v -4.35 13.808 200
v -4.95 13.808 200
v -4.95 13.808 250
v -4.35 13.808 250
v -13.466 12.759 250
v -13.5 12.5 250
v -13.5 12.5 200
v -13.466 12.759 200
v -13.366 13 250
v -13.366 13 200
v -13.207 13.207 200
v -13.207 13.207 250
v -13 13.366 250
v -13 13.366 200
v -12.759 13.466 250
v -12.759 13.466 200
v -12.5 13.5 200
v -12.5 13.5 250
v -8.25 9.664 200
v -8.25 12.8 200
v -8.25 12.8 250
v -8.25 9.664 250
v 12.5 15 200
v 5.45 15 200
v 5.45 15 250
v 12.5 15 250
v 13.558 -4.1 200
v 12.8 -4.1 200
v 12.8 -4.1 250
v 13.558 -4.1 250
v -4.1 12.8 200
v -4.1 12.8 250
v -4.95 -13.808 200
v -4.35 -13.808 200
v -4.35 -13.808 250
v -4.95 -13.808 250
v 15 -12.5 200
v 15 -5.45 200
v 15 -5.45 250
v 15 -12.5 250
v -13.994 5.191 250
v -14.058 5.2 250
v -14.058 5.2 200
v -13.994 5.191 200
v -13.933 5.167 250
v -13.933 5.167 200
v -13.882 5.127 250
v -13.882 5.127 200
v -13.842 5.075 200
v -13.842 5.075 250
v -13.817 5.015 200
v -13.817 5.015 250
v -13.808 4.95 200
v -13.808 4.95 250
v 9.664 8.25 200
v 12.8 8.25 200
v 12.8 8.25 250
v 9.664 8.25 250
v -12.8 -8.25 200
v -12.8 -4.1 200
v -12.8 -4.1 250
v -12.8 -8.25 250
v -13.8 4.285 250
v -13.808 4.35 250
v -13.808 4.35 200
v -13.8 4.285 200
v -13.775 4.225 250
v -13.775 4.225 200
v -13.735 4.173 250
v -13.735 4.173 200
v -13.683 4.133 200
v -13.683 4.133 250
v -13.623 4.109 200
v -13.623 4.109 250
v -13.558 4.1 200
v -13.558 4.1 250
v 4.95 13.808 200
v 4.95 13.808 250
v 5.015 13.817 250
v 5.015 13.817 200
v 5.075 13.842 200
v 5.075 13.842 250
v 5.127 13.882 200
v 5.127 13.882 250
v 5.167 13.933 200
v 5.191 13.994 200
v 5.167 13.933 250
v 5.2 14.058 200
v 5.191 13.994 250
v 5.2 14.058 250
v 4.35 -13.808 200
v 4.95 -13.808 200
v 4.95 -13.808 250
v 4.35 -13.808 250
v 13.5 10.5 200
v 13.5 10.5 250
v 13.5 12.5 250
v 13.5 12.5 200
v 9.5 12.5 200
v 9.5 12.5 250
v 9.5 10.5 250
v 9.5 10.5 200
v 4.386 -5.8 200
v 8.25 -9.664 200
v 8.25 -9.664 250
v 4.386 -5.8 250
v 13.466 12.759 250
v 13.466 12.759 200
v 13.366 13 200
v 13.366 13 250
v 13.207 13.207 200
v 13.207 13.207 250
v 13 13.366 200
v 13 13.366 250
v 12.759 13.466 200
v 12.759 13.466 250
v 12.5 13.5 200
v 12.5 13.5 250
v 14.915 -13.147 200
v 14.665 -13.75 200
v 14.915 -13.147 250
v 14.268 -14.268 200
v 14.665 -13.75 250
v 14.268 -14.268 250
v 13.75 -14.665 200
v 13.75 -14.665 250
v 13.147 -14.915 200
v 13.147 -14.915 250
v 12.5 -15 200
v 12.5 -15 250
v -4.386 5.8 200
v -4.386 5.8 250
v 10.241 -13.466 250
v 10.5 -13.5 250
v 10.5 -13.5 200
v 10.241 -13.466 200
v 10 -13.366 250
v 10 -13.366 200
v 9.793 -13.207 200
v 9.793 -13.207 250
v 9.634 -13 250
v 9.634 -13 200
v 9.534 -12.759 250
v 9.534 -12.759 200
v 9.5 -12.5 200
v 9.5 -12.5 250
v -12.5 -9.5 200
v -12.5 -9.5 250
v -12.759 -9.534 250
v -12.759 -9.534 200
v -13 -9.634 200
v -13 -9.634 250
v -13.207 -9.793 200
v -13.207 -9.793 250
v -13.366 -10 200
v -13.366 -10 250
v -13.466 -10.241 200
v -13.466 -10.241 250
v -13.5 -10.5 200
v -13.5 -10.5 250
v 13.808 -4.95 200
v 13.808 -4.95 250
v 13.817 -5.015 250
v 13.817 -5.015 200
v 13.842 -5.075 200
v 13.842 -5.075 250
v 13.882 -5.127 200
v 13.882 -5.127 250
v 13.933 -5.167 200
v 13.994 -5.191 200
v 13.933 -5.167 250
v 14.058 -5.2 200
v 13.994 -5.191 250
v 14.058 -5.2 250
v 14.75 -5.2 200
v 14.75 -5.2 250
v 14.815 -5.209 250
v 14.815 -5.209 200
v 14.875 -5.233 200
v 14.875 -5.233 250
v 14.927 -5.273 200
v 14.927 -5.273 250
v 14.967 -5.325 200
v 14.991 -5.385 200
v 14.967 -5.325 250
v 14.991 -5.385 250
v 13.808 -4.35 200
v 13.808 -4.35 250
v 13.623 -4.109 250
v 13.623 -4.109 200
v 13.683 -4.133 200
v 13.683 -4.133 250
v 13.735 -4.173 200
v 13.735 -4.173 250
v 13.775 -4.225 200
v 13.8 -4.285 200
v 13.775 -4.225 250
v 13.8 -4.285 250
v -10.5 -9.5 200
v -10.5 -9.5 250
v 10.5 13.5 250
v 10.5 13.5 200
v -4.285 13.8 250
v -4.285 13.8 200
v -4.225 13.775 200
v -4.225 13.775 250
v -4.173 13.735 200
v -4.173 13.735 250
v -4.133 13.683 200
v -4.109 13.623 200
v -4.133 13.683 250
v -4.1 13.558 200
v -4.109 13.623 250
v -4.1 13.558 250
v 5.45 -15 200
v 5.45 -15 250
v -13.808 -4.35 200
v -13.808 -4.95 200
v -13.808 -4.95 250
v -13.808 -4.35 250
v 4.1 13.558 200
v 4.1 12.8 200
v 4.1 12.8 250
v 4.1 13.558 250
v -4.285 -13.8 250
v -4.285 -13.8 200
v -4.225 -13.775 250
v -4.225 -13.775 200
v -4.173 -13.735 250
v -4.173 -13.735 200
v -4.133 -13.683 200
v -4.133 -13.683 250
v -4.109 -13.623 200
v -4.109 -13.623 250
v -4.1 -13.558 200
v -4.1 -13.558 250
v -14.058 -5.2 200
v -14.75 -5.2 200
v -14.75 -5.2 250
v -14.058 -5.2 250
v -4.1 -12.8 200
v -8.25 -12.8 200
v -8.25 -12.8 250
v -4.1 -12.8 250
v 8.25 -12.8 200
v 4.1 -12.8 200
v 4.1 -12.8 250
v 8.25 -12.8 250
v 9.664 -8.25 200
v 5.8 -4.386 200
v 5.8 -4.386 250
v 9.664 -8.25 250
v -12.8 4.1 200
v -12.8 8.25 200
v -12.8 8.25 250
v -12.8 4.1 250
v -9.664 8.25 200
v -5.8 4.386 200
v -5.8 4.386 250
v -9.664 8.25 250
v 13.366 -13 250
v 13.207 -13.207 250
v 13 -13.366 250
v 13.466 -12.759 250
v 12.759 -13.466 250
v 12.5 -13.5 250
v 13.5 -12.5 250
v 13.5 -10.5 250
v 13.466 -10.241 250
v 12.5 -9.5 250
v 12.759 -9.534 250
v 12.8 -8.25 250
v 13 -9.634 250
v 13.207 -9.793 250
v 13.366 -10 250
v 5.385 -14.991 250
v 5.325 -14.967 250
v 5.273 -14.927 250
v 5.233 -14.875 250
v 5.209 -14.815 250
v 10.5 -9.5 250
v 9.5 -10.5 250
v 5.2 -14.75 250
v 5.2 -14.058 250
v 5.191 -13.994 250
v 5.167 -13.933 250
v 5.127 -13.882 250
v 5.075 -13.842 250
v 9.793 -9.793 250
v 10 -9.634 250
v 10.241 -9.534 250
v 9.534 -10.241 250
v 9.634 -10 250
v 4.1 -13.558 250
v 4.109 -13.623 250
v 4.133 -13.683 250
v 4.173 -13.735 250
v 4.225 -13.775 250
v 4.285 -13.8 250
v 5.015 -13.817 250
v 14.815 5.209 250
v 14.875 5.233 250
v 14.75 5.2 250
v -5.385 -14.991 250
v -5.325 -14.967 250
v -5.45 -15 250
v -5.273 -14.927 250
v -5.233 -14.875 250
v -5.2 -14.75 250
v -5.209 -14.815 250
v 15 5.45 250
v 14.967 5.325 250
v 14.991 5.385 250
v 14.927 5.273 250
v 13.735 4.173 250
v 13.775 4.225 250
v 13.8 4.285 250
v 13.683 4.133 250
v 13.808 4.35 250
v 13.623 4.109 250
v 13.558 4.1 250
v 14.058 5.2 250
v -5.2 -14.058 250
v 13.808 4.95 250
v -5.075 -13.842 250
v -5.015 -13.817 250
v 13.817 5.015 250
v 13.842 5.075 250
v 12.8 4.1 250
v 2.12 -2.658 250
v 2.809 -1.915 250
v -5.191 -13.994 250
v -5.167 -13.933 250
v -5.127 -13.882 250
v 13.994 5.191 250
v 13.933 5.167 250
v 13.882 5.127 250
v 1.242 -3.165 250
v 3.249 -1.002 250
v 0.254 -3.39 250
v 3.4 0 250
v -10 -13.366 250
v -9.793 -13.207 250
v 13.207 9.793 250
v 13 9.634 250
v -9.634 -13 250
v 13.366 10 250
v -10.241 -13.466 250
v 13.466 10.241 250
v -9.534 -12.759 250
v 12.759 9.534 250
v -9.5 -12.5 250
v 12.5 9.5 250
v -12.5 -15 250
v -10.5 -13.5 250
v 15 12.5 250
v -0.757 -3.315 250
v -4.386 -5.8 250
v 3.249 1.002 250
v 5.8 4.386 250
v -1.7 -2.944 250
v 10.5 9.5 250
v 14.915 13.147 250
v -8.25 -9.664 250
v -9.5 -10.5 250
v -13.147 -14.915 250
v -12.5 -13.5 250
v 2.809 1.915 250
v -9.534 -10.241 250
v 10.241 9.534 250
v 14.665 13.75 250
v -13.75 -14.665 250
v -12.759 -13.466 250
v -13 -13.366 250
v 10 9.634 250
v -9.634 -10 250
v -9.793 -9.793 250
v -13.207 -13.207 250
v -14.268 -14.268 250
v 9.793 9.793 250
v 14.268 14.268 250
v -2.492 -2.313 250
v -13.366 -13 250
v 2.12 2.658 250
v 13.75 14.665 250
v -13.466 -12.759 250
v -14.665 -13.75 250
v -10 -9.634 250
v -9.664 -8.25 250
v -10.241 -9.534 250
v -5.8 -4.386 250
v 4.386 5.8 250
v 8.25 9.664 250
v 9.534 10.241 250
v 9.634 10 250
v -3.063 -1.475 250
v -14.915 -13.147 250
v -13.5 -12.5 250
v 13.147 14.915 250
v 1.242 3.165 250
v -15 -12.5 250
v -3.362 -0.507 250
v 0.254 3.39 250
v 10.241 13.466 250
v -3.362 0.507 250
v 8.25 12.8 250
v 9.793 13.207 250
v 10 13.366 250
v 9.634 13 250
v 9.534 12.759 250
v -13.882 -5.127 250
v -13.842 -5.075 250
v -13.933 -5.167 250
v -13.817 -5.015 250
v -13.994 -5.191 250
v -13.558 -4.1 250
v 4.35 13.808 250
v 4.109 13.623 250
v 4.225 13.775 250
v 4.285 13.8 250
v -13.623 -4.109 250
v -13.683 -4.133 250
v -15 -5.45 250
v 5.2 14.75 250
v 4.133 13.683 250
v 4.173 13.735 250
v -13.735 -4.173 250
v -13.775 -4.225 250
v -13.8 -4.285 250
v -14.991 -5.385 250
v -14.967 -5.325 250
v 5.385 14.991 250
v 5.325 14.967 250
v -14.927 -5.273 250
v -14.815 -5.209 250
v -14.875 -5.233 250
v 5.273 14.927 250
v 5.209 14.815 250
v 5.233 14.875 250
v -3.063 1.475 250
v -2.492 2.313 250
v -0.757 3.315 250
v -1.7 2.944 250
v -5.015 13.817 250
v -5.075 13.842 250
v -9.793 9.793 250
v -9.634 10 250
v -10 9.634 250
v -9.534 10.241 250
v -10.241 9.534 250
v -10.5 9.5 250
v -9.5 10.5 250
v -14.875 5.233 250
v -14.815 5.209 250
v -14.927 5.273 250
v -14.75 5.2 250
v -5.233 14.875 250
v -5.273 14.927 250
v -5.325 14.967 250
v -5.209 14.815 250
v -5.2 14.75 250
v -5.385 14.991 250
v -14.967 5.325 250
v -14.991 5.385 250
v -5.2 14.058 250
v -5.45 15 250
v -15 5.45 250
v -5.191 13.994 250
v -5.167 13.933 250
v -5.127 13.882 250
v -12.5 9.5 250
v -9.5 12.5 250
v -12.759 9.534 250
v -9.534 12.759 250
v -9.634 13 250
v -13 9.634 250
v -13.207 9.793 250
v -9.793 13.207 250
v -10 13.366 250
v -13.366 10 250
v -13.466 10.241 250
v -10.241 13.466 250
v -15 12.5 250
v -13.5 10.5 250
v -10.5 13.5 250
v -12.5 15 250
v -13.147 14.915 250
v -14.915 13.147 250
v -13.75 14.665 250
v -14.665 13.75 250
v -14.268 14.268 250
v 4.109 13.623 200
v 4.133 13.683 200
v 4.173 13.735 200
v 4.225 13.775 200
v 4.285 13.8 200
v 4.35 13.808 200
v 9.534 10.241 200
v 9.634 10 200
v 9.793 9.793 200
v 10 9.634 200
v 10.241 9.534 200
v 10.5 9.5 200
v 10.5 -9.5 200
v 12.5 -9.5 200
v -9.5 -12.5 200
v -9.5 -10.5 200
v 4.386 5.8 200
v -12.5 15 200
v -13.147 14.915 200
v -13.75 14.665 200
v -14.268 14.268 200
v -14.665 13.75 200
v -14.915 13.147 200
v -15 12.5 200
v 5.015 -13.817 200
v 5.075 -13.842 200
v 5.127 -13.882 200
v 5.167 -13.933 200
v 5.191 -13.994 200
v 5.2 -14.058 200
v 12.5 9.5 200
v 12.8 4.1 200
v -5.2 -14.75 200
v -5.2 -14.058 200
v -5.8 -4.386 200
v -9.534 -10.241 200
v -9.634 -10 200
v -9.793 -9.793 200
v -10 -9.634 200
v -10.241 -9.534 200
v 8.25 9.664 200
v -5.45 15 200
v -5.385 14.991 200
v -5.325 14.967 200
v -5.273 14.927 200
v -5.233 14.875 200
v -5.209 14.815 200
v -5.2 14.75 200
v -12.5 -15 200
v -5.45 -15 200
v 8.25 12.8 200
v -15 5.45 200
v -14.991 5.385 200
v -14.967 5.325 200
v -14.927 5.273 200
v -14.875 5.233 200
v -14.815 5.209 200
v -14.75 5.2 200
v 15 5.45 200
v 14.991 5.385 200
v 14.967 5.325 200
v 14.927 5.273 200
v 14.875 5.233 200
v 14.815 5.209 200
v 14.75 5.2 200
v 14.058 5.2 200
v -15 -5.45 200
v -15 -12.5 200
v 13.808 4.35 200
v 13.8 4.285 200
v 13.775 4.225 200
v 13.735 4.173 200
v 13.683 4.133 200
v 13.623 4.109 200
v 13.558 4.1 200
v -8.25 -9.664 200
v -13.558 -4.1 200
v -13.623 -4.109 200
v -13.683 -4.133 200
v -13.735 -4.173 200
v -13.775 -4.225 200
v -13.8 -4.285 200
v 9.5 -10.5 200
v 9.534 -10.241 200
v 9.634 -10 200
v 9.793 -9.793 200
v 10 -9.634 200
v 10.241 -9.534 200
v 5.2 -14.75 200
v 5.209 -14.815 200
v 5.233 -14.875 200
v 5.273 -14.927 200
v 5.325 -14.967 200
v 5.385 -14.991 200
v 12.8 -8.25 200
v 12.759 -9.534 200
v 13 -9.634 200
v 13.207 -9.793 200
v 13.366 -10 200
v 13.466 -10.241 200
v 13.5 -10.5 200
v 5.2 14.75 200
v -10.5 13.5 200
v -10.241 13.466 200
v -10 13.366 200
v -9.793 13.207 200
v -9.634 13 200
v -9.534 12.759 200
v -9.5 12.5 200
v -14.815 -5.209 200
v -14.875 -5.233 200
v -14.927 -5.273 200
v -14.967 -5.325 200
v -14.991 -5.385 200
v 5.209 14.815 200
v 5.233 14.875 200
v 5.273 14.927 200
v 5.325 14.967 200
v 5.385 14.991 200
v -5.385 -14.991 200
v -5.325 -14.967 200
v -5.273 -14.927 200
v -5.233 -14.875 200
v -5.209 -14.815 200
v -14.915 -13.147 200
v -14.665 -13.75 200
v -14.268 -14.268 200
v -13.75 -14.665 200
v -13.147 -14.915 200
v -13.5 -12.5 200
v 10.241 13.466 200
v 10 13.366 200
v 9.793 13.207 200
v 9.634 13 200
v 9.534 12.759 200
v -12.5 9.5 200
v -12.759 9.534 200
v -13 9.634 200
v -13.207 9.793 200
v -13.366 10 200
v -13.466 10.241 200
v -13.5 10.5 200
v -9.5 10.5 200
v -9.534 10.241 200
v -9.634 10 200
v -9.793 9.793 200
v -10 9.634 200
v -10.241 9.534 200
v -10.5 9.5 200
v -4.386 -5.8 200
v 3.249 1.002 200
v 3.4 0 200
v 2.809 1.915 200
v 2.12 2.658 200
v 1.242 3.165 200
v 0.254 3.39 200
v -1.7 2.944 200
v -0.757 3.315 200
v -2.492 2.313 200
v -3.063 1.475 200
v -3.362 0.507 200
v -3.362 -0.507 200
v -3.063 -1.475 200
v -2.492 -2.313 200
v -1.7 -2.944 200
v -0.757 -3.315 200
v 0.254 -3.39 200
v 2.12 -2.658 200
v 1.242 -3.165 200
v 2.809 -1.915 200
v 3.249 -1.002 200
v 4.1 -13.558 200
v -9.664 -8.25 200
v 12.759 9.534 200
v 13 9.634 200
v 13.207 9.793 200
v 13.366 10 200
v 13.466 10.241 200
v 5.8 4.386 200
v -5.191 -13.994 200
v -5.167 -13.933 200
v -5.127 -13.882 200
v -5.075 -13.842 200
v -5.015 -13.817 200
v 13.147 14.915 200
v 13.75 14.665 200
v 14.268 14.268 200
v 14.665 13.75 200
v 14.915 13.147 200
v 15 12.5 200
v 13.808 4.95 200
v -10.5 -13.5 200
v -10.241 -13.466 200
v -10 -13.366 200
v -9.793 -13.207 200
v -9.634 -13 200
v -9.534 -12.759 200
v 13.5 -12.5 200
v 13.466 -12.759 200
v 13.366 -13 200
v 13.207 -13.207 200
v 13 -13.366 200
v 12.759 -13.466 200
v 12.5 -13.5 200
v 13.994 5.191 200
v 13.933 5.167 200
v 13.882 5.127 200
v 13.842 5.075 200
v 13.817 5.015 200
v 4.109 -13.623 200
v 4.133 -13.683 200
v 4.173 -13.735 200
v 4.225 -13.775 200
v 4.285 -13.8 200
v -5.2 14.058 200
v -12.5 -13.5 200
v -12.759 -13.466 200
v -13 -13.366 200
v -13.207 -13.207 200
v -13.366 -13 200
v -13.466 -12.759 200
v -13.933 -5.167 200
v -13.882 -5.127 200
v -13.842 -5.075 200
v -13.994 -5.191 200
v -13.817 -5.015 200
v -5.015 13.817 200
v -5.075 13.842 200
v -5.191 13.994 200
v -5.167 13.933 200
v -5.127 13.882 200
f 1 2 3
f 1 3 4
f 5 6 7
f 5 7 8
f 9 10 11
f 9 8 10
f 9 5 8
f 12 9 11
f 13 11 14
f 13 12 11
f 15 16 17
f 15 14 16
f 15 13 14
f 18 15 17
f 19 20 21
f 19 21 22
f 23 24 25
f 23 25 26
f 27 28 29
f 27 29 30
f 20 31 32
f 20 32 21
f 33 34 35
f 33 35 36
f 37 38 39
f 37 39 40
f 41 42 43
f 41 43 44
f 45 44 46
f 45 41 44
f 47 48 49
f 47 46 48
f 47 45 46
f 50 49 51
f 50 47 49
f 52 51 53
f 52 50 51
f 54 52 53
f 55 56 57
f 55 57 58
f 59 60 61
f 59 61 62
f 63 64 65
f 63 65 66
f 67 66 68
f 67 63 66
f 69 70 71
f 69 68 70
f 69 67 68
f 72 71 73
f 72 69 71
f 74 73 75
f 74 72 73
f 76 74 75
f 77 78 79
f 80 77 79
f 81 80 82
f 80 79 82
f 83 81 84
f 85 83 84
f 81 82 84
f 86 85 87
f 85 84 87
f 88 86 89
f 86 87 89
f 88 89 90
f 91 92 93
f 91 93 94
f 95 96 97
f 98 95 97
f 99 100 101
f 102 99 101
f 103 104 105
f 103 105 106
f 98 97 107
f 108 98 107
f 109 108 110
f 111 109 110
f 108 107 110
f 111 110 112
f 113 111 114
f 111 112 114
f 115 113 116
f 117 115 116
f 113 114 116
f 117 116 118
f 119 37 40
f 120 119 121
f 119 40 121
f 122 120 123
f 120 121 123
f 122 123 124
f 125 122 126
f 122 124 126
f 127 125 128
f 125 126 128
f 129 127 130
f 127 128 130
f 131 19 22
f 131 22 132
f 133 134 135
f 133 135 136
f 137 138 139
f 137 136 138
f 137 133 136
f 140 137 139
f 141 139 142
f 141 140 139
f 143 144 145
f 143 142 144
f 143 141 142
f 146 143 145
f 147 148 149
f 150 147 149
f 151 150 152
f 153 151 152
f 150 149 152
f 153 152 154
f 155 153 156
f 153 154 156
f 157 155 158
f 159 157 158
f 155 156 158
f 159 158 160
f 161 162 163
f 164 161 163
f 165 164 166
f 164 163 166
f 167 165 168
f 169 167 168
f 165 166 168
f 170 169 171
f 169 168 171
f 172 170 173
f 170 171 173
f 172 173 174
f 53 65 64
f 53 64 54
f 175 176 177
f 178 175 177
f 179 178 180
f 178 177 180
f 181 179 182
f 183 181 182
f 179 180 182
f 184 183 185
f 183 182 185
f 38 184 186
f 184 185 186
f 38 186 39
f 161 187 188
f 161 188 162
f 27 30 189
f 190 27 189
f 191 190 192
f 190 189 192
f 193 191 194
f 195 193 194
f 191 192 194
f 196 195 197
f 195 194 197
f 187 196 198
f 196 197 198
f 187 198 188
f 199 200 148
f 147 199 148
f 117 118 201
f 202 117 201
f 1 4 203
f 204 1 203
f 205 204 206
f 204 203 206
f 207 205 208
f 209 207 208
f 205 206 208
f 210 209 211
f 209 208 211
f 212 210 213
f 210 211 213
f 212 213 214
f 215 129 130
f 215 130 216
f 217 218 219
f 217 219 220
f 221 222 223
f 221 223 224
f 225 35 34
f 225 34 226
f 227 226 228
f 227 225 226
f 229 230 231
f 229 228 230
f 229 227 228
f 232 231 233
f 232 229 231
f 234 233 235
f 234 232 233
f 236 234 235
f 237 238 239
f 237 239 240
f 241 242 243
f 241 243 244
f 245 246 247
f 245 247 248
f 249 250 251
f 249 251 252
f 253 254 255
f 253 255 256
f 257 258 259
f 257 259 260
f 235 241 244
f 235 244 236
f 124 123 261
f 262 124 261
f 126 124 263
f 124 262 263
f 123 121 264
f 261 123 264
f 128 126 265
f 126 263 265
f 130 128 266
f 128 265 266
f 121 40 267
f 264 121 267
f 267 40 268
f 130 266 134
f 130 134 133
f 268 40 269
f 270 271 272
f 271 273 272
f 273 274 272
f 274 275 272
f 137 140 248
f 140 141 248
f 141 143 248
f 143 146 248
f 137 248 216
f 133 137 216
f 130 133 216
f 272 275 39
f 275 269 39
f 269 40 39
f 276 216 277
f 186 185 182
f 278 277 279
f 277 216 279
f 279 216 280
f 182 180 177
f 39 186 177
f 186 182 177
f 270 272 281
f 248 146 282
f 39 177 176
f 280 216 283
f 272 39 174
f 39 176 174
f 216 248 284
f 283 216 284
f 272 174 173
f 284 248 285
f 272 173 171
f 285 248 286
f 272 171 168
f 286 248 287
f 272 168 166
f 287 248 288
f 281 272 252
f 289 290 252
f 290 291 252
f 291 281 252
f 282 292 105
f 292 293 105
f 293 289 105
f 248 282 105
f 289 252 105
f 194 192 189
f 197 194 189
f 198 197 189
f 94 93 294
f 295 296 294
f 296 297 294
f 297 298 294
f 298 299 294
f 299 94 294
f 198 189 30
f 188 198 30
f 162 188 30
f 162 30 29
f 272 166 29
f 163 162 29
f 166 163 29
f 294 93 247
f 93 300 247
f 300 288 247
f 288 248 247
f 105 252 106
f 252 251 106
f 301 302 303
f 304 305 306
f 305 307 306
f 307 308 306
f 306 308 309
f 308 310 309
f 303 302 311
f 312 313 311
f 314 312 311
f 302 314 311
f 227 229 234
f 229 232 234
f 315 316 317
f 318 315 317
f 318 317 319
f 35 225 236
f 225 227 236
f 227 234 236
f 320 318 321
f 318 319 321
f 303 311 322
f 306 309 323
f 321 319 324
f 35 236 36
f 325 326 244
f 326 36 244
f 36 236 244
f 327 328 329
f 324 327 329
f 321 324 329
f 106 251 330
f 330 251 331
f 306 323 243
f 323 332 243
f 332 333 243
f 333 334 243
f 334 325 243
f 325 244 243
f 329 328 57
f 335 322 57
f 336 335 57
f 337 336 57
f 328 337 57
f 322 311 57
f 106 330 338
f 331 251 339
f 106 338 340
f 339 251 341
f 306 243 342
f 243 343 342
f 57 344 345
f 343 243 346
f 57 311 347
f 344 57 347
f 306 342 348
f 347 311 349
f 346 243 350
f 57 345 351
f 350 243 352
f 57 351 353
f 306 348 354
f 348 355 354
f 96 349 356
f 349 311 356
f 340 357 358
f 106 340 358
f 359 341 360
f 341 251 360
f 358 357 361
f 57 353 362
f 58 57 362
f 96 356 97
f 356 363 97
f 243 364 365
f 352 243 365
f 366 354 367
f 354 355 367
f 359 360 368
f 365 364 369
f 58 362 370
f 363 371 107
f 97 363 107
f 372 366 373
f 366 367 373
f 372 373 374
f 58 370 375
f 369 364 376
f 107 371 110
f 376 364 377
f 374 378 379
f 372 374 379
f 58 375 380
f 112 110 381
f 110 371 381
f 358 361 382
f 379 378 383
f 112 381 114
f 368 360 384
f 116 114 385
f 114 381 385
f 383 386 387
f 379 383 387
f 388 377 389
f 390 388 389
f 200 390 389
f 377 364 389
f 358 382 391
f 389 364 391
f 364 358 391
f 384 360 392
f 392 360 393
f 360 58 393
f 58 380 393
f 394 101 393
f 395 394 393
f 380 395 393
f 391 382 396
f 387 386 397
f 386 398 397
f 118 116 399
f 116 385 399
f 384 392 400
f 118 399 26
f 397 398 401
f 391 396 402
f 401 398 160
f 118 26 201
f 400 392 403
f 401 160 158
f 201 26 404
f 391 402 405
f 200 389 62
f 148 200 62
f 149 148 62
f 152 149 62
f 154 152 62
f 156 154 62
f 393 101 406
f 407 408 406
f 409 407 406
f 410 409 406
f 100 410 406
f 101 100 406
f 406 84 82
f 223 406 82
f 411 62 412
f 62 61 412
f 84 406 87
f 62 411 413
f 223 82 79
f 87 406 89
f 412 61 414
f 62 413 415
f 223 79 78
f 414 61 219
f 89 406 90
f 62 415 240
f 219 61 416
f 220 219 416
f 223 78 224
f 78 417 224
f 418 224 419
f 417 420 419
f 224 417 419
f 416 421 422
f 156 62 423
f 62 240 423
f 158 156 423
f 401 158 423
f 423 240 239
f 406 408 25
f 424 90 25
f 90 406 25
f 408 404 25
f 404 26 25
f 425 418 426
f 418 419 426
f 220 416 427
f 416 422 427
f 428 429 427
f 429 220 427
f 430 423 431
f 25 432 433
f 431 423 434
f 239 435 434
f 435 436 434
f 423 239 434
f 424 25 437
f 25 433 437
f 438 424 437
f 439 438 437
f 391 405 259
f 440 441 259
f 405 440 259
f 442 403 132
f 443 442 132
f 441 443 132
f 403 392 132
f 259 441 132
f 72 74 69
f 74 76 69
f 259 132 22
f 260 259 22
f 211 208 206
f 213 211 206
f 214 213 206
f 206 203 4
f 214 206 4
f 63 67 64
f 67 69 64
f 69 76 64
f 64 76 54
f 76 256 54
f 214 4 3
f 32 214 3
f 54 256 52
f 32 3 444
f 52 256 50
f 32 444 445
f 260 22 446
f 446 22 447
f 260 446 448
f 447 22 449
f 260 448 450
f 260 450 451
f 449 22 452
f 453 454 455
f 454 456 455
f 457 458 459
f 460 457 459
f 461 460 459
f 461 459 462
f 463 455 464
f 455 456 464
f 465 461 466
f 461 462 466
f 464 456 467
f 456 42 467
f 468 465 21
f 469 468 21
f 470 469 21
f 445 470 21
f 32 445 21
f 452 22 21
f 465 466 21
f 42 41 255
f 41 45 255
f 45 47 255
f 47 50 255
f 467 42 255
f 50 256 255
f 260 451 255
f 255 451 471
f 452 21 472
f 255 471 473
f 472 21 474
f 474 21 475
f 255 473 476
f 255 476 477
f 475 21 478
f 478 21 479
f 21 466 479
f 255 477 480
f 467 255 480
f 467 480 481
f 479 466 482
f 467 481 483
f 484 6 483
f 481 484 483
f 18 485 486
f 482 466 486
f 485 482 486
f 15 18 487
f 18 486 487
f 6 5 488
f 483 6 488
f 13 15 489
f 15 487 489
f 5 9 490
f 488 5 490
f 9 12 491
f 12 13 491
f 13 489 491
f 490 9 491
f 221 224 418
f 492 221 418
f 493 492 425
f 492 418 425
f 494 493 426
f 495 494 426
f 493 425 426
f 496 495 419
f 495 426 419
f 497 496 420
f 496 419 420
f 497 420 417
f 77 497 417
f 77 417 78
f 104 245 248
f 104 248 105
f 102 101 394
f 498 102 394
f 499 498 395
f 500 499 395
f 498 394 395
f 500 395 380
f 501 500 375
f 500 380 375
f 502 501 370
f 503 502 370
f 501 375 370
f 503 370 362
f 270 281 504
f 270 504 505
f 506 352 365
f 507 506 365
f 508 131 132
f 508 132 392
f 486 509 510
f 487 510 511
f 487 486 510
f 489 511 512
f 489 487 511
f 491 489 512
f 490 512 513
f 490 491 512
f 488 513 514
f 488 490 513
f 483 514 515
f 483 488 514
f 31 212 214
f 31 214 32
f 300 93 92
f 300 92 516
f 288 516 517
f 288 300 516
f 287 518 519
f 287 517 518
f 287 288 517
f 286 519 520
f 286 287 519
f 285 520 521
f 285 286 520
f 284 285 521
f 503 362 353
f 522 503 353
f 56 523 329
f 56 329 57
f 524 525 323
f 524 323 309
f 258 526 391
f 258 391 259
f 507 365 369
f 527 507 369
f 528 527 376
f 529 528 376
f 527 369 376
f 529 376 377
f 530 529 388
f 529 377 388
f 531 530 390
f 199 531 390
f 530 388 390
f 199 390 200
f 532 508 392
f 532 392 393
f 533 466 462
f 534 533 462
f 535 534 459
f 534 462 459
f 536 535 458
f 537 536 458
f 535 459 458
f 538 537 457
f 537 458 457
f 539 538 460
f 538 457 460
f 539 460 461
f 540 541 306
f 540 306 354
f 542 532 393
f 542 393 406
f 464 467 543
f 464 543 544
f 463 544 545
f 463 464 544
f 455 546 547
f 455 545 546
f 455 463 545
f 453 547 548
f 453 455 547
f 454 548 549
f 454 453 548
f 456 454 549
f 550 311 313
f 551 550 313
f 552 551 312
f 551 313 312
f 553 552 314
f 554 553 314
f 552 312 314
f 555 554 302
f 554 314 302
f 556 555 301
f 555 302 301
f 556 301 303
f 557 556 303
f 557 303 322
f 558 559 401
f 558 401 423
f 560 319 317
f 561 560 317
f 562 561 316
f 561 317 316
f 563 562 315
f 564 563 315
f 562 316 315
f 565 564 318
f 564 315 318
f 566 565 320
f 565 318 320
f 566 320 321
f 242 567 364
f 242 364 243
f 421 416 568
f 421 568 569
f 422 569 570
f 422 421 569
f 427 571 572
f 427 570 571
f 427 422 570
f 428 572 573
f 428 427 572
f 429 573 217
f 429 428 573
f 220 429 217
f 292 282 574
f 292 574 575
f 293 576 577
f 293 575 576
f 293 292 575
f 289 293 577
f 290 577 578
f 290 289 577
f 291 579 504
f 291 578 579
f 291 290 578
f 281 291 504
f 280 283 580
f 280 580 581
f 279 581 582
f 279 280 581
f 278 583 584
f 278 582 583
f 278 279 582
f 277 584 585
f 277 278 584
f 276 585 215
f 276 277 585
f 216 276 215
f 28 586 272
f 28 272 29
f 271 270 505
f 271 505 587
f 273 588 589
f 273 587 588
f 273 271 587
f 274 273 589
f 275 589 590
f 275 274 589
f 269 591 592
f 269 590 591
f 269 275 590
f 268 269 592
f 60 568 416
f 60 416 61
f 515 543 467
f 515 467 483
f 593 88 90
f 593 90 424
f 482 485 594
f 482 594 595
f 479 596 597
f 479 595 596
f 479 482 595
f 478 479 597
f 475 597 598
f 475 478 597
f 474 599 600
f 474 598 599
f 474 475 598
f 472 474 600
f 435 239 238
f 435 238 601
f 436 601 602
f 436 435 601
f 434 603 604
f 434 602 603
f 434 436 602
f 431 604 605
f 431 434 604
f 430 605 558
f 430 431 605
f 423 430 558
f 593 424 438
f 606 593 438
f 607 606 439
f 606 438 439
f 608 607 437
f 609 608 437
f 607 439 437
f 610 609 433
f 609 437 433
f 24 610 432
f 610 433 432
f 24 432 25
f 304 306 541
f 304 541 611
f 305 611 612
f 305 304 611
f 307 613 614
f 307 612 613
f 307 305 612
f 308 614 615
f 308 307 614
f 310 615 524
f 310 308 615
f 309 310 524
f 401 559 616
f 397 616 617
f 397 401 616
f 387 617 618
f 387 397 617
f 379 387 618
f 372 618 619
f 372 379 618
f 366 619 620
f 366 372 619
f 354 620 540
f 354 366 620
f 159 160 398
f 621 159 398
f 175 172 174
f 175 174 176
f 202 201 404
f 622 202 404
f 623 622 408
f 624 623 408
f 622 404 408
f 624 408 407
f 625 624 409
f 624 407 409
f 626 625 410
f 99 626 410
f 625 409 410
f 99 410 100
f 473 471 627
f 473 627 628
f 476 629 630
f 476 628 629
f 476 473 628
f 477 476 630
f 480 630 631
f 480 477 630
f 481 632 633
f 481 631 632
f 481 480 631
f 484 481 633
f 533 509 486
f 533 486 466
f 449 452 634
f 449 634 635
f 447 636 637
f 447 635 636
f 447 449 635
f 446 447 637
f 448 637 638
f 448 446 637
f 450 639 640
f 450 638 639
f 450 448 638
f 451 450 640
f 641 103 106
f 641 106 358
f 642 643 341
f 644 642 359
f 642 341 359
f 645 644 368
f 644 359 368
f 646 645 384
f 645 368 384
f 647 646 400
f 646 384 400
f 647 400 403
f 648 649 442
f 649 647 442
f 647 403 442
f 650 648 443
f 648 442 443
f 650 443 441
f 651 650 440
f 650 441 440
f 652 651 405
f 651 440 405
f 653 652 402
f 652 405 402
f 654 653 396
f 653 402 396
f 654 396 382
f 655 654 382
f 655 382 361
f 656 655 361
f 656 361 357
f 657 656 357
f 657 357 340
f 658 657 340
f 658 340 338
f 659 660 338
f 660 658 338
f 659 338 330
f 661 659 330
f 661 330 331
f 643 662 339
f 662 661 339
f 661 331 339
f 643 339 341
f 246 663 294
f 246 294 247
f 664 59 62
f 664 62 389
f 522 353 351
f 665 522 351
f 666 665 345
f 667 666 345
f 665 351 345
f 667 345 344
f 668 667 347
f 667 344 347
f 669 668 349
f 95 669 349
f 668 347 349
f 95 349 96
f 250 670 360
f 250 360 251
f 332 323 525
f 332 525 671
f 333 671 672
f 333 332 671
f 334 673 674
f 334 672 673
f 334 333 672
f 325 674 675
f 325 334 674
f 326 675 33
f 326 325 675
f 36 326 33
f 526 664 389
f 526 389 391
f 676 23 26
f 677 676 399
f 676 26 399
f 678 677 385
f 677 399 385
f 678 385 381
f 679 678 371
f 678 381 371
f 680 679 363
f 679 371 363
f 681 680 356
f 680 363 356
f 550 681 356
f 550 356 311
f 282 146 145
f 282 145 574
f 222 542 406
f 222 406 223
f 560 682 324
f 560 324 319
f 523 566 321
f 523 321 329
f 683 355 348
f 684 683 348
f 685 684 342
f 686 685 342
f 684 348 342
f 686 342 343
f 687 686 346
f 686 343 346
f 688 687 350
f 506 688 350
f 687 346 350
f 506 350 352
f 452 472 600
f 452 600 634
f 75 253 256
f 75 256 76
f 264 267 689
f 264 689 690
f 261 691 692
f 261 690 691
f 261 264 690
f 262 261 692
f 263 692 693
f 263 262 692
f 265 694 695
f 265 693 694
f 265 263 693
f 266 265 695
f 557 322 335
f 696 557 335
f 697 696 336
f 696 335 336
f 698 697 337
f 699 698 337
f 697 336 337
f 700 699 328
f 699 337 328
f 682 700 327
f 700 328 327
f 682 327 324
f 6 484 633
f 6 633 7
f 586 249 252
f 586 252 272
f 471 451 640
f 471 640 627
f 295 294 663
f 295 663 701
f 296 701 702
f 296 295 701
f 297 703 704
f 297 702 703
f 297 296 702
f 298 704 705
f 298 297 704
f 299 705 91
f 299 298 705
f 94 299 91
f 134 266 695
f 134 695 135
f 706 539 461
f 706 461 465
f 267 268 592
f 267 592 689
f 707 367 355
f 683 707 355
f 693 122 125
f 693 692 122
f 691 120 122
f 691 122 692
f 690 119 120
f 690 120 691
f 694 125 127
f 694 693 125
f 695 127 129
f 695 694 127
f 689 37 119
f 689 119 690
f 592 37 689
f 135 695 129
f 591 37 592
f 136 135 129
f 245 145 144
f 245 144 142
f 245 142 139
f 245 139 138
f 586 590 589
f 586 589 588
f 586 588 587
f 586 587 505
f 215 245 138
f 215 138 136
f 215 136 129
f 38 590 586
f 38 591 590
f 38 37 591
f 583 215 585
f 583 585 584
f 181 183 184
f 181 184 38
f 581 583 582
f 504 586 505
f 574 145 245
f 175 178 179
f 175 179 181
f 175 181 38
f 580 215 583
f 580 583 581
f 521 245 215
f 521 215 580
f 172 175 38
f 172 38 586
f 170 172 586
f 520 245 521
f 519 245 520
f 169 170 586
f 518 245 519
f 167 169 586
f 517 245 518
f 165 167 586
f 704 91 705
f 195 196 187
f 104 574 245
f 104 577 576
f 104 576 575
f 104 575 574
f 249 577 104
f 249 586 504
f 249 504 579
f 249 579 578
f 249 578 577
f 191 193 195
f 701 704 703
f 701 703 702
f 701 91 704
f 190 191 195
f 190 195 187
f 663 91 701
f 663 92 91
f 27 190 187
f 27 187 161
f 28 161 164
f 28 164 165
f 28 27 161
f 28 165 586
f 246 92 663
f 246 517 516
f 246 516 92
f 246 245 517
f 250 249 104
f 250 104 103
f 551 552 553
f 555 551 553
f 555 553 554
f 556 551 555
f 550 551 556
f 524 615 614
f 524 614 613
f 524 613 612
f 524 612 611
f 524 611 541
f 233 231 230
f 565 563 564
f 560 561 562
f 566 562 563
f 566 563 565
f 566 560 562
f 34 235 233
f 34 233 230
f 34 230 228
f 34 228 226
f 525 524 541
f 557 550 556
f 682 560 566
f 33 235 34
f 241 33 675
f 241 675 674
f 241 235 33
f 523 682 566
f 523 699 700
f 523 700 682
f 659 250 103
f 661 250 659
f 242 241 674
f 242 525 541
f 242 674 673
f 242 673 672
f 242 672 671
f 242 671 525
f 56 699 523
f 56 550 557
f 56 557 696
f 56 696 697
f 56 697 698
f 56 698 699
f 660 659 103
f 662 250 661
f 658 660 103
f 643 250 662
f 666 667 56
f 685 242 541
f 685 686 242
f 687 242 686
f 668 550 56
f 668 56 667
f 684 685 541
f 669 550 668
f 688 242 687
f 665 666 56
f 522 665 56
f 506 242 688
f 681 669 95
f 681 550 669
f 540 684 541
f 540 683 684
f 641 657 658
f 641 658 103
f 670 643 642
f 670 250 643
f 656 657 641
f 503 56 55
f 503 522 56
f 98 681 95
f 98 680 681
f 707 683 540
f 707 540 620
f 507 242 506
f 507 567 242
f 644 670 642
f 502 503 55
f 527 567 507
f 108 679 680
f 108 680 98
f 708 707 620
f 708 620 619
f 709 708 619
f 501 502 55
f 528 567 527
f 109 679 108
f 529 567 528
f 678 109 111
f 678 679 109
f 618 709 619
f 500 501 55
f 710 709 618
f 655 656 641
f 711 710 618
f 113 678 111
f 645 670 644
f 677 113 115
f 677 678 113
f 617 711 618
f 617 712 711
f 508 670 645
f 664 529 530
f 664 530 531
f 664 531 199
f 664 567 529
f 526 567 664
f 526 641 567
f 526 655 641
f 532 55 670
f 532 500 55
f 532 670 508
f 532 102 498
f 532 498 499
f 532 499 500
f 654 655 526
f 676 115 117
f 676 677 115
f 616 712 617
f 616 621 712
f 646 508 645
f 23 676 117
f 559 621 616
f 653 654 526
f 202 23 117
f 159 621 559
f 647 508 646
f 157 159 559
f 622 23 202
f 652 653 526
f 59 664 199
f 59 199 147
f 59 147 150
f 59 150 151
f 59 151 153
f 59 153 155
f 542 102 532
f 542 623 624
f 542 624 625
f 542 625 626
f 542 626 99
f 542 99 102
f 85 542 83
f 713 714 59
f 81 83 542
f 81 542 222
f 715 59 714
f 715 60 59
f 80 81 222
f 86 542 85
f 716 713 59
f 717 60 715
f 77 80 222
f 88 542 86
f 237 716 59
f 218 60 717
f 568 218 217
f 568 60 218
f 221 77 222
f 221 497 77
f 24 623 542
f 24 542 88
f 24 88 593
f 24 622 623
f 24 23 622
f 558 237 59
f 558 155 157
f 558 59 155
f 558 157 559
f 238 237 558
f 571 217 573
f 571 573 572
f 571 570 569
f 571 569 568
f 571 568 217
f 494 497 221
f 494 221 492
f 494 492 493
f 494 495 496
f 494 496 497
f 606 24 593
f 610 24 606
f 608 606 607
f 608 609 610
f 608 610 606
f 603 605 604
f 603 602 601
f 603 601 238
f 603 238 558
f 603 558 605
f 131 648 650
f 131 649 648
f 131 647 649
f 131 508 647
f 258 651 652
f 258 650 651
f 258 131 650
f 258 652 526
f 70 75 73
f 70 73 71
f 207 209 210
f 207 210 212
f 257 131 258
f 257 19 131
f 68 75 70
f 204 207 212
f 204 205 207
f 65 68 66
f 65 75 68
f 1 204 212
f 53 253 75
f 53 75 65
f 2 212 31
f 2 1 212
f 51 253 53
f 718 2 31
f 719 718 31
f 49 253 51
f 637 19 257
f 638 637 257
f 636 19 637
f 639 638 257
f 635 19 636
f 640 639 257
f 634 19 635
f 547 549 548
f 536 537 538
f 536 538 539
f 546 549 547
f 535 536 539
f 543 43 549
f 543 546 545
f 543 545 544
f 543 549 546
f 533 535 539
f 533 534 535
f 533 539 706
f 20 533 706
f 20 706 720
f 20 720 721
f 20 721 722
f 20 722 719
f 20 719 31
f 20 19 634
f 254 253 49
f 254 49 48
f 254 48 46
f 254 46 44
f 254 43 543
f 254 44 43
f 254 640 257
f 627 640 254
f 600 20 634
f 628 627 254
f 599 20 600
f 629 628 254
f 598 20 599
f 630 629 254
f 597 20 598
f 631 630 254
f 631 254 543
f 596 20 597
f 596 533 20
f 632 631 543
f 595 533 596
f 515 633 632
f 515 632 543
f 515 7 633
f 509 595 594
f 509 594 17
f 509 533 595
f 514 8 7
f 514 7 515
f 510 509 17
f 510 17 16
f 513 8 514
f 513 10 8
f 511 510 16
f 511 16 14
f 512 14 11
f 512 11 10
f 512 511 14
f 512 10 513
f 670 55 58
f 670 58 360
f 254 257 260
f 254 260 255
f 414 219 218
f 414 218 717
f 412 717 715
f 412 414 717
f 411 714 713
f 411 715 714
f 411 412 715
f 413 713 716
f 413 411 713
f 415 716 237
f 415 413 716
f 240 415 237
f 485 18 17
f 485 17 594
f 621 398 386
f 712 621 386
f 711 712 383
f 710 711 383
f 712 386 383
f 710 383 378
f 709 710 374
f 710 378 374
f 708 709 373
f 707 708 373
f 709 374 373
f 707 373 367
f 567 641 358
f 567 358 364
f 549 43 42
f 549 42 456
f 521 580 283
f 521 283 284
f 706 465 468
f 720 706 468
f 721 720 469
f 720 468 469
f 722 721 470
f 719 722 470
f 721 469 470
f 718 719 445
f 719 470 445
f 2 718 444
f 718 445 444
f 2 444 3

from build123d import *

# Parameters (mm, degrees)
BOSS_EXTRUDE1_DEPTH = 250
SKETCH2_R           = 3.4
CUT_EXTRUDE1_DEPTH  = 251.898385806
FILLET1_R           = 2.5
FILLET2_R           = 0.25
CUT_EXTRUDE3_START  = -200
SKETCH3_R           = 3.4
CUT_EXTRUDE3_DEPTH  = 200


with BuildPart() as part:
    # Sketch1 → Boss-Extrude1 (new body)
    with BuildSketch(Plane.XY):
        Polygon((-15, 15), (-5.2, 15), (-5.2, 13.808325472), (-4.1, 13.808325472), (-4.1, 12.8), (-8.25, 12.8), (-8.25, 9.664213562), (-4.385786438, 5.8), (4.385786438, 5.8), (8.25, 9.664213562), (8.25, 12.8), (4.1, 12.8), (4.1, 13.808325472), (5.2, 13.808325472), (5.2, 15), (15, 15), (15, 5.2), (13.808325472, 5.2), (13.808325472, 4.1), (12.8, 4.1), (12.8, 8.25), (9.664213562, 8.25), (5.8, 4.385786438), (5.8, -4.385786438), (9.664213562, -8.25), (12.8, -8.25), (12.8, -4.1), (13.808325472, -4.1), (13.808325472, -5.2), (15, -5.2), (15, -15), (5.2, -15), (5.2, -13.808325472), (4.1, -13.808325472), (4.1, -12.8), (8.25, -12.8), (8.25, -9.664213562), (4.385786438, -5.8), (-4.385786438, -5.8), (-8.25, -9.664213562), (-8.25, -12.8), (-4.1, -12.8), (-4.1, -13.808325472), (-5.2, -13.808325472), (-5.2, -15), (-15, -15), (-15, -5.2), (-13.808325472, -5.2), (-13.808325472, -4.1), (-12.8, -4.1), (-12.8, -8.25), (-9.664213562, -8.25), (-5.8, -4.385786438), (-5.8, 4.385786438), (-9.664213562, 8.25), (-12.8, 8.25), (-12.8, 4.1), (-13.808325472, 4.1), (-13.808325472, 5.2), (-15, 5.2), align=None)
    extrude(amount=BOSS_EXTRUDE1_DEPTH)

    # Sketch2 → Cut-Extrude1 (cut, through all)
    with BuildSketch(Plane.XY.offset(250)):
        Circle(SKETCH2_R)
        with BuildLine():
            Line((-12.5, 13.5), (-10.5, 13.5))
            ThreePointArc((-10.5, 13.5), (-9.792893219, 13.207106781), (-9.5, 12.5))
            Line((-9.5, 12.5), (-9.5, 10.5))
            ThreePointArc((-9.5, 10.5), (-9.792893219, 9.792893219), (-10.5, 9.5))
            Line((-10.5, 9.5), (-12.5, 9.5))
            ThreePointArc((-12.5, 9.5), (-13.207106781, 9.792893219), (-13.5, 10.5))
            Line((-13.5, 10.5), (-13.5, 12.5))
            ThreePointArc((-13.5, 12.5), (-13.207106781, 13.207106781), (-12.5, 13.5))
        make_face()
        with BuildLine():
            Line((9.5, 12.5), (9.5, 10.5))
            ThreePointArc((9.5, 10.5), (9.792893219, 9.792893219), (10.5, 9.5))
            Line((10.5, 9.5), (12.5, 9.5))
            ThreePointArc((12.5, 9.5), (13.207106781, 9.792893219), (13.5, 10.5))
            Line((13.5, 10.5), (13.5, 12.5))
            ThreePointArc((13.5, 12.5), (13.207106781, 13.207106781), (12.5, 13.5))
            Line((12.5, 13.5), (10.5, 13.5))
            ThreePointArc((10.5, 13.5), (9.792893219, 13.207106781), (9.5, 12.5))
        make_face()
        with BuildLine():
            Line((12.5, -13.5), (10.5, -13.5))
            ThreePointArc((10.5, -13.5), (9.792893219, -13.207106781), (9.5, -12.5))
            Line((9.5, -12.5), (9.5, -10.5))
            ThreePointArc((9.5, -10.5), (9.792893219, -9.792893219), (10.5, -9.5))
            Line((10.5, -9.5), (12.5, -9.5))
            ThreePointArc((12.5, -9.5), (13.207106781, -9.792893219), (13.5, -10.5))
            Line((13.5, -10.5), (13.5, -12.5))
            ThreePointArc((13.5, -12.5), (13.207106781, -13.207106781), (12.5, -13.5))
        make_face()
        with BuildLine():
            Line((-9.5, -12.5), (-9.5, -10.5))
            ThreePointArc((-9.5, -10.5), (-9.792893219, -9.792893219), (-10.5, -9.5))
            Line((-10.5, -9.5), (-12.5, -9.5))
            ThreePointArc((-12.5, -9.5), (-13.207106781, -9.792893219), (-13.5, -10.5))
            Line((-13.5, -10.5), (-13.5, -12.5))
            ThreePointArc((-13.5, -12.5), (-13.207106781, -13.207106781), (-12.5, -13.5))
            Line((-12.5, -13.5), (-10.5, -13.5))
            ThreePointArc((-10.5, -13.5), (-9.792893219, -13.207106781), (-9.5, -12.5))
        make_face()
    extrude(amount=-CUT_EXTRUDE1_DEPTH, mode=Mode.SUBTRACT)

    # Fillet1
    fillet1_edges = [part.edges().sort_by_distance(p)[0] for p in [
        (15, -15, 125),
        (-15, -15, 125),
        (-15, 15, 125),
        (15, 15, 125),
    ]]
    fillet(fillet1_edges, radius=FILLET1_R)

    # Fillet2
    fillet2_edges = [part.edges().sort_by_distance(p)[0] for p in [
        (5.2, -15, 125),
        (5.2, -13.808325472, 125),
        (4.1, -13.808325472, 125),
        (-4.1, -13.808325472, 125),
        (-5.2, -13.808325472, 125),
        (-5.2, -15, 125),
        (-15, -5.2, 125),
        (-13.808325472, -5.2, 125),
        (-13.808325472, -4.1, 125),
        (-13.808325472, 4.1, 125),
        (-13.808325472, 5.2, 125),
        (-15, 5.2, 125),
        (-5.2, 15, 125),
        (-5.2, 13.808325472, 125),
        (-4.1, 13.808325472, 125),
        (4.1, 13.808325472, 125),
        (5.2, 13.808325472, 125),
        (5.2, 15, 125),
        (15, 5.2, 125),
        (13.808325472, 5.2, 125),
        (13.808325472, 4.1, 125),
        (13.808325472, -4.1, 125),
        (13.808325472, -5.2, 125),
        (15, -5.2, 125),
    ]]
    fillet(fillet2_edges, radius=FILLET2_R)

    # Sketch3 → Cut-Extrude3 (cut)
    with BuildSketch(Plane(origin=(0, 0, 0), x_dir=(-1, 0, 0), z_dir=(0, 0, -1)).offset(CUT_EXTRUDE3_START)):
        with BuildLine():
            Line((12.8, 4.1), (13.558325472, 4.1))
            ThreePointArc((13.558325472, 4.1), (13.735102167, 4.173223305), (13.808325472, 4.35))
            Line((13.808325472, 4.35), (13.808325472, 4.95))
            ThreePointArc((13.808325472, 4.95), (13.881548777, 5.126776695), (14.058325472, 5.2))
            Line((14.058325472, 5.2), (14.75, 5.2))
            ThreePointArc((14.75, 5.2), (14.926776695, 5.273223305), (15, 5.45))
            Line((15, 5.45), (15, 12.5))
            ThreePointArc((15, 12.5), (14.267766953, 14.267766953), (12.5, 15))
            Line((12.5, 15), (5.45, 15))
            ThreePointArc((5.45, 15), (5.273223305, 14.926776695), (5.2, 14.75))
            Line((5.2, 14.75), (5.2, 14.058325472))
            ThreePointArc((5.2, 14.058325472), (5.126776695, 13.881548777), (4.95, 13.808325472))
            Line((4.95, 13.808325472), (4.35, 13.808325472))
            ThreePointArc((4.35, 13.808325472), (4.173223305, 13.735102167), (4.1, 13.558325472))
            Line((4.1, 13.558325472), (4.1, 12.8))
            Line((4.1, 12.8), (8.25, 12.8))
            Line((8.25, 12.8), (8.25, 9.664213562))
            Line((8.25, 9.664213562), (4.385786438, 5.8))
            Line((4.385786438, 5.8), (-4.385786438, 5.8))
            Line((-4.385786438, 5.8), (-8.25, 9.664213562))
            Line((-8.25, 9.664213562), (-8.25, 12.8))
            Line((-8.25, 12.8), (-4.1, 12.8))
            Line((-4.1, 12.8), (-4.1, 13.558325472))
            ThreePointArc((-4.1, 13.558325472), (-4.173223305, 13.735102167), (-4.35, 13.808325472))
            Line((-4.35, 13.808325472), (-4.95, 13.808325472))
            ThreePointArc((-4.95, 13.808325472), (-5.126776695, 13.881548777), (-5.2, 14.058325472))
            Line((-5.2, 14.058325472), (-5.2, 14.75))
            ThreePointArc((-5.2, 14.75), (-5.273223305, 14.926776695), (-5.45, 15))
            Line((-5.45, 15), (-12.5, 15))
            ThreePointArc((-12.5, 15), (-14.267766953, 14.267766953), (-15, 12.5))
            Line((-15, 12.5), (-15, 5.45))
            ThreePointArc((-15, 5.45), (-14.926776695, 5.273223305), (-14.75, 5.2))
            Line((-14.75, 5.2), (-14.058325472, 5.2))
            ThreePointArc((-14.058325472, 5.2), (-13.881548777, 5.126776695), (-13.808325472, 4.95))
            Line((-13.808325472, 4.95), (-13.808325472, 4.35))
            ThreePointArc((-13.808325472, 4.35), (-13.735102167, 4.173223305), (-13.558325472, 4.1))
            Line((-13.558325472, 4.1), (-12.8, 4.1))
            Line((-12.8, 4.1), (-12.8, 8.25))
            Line((-12.8, 8.25), (-9.664213562, 8.25))
            Line((-9.664213562, 8.25), (-5.8, 4.385786438))
            Line((-5.8, 4.385786438), (-5.8, -4.385786438))
            Line((-5.8, -4.385786438), (-9.664213562, -8.25))
            Line((-9.664213562, -8.25), (-12.8, -8.25))
            Line((-12.8, -8.25), (-12.8, -4.1))
            Line((-12.8, -4.1), (-13.558325472, -4.1))
            ThreePointArc((-13.558325472, -4.1), (-13.735102167, -4.173223305), (-13.808325472, -4.35))
            Line((-13.808325472, -4.35), (-13.808325472, -4.95))
            ThreePointArc((-13.808325472, -4.95), (-13.881548777, -5.126776695), (-14.058325472, -5.2))
            Line((-14.058325472, -5.2), (-14.75, -5.2))
            ThreePointArc((-14.75, -5.2), (-14.926776695, -5.273223305), (-15, -5.45))
            Line((-15, -5.45), (-15, -12.5))
            ThreePointArc((-15, -12.5), (-14.267766953, -14.267766953), (-12.5, -15))
            Line((-12.5, -15), (-5.45, -15))
            ThreePointArc((-5.45, -15), (-5.273223305, -14.926776695), (-5.2, -14.75))
            Line((-5.2, -14.75), (-5.2, -14.058325472))
            ThreePointArc((-5.2, -14.058325472), (-5.126776695, -13.881548777), (-4.95, -13.808325472))
            Line((-4.95, -13.808325472), (-4.35, -13.808325472))
            ThreePointArc((-4.35, -13.808325472), (-4.173223305, -13.735102167), (-4.1, -13.558325472))
            Line((-4.1, -13.558325472), (-4.1, -12.8))
            Line((-4.1, -12.8), (-8.25, -12.8))
            Line((-8.25, -12.8), (-8.25, -9.664213562))
            Line((-8.25, -9.664213562), (-4.385786438, -5.8))
            Line((-4.385786438, -5.8), (4.385786438, -5.8))
            Line((4.385786438, -5.8), (8.25, -9.664213562))
            Line((8.25, -9.664213562), (8.25, -12.8))
            Line((8.25, -12.8), (4.1, -12.8))
            Line((4.1, -12.8), (4.1, -13.558325472))
            ThreePointArc((4.1, -13.558325472), (4.173223305, -13.735102167), (4.35, -13.808325472))
            Line((4.35, -13.808325472), (4.95, -13.808325472))
            ThreePointArc((4.95, -13.808325472), (5.126776695, -13.881548777), (5.2, -14.058325472))
            Line((5.2, -14.058325472), (5.2, -14.75))
            ThreePointArc((5.2, -14.75), (5.273223305, -14.926776695), (5.45, -15))
            Line((5.45, -15), (12.5, -15))
            ThreePointArc((12.5, -15), (14.267766953, -14.267766953), (15, -12.5))
            Line((15, -12.5), (15, -5.45))
            ThreePointArc((15, -5.45), (14.926776695, -5.273223305), (14.75, -5.2))
            Line((14.75, -5.2), (14.058325472, -5.2))
            ThreePointArc((14.058325472, -5.2), (13.881548777, -5.126776695), (13.808325472, -4.95))
            Line((13.808325472, -4.95), (13.808325472, -4.35))
            ThreePointArc((13.808325472, -4.35), (13.735102167, -4.173223305), (13.558325472, -4.1))
            Line((13.558325472, -4.1), (12.8, -4.1))
            Line((12.8, -4.1), (12.8, -8.25))
            Line((12.8, -8.25), (9.664213562, -8.25))
            Line((9.664213562, -8.25), (5.8, -4.385786438))
            Line((5.8, -4.385786438), (5.8, 4.385786438))
            Line((5.8, 4.385786438), (9.664213562, 8.25))
            Line((9.664213562, 8.25), (12.8, 8.25))
            Line((12.8, 8.25), (12.8, 4.1))
        make_face()
        with Locations(Location((0, 0, 0), (0, 0, 180))):
            Circle(SKETCH3_R, mode=Mode.SUBTRACT)
        with BuildLine():
            Line((-9.5, 12.5), (-9.5, 10.5))
            ThreePointArc((-9.5, 10.5), (-9.792893219, 9.792893219), (-10.5, 9.5))
            Line((-10.5, 9.5), (-12.5, 9.5))
            ThreePointArc((-12.5, 9.5), (-13.207106781, 9.792893219), (-13.5, 10.5))
            Line((-13.5, 10.5), (-13.5, 12.5))
            ThreePointArc((-13.5, 12.5), (-13.207106781, 13.207106781), (-12.5, 13.5))
            Line((-12.5, 13.5), (-10.5, 13.5))
            ThreePointArc((-10.5, 13.5), (-9.792893219, 13.207106781), (-9.5, 12.5))
        make_face(mode=Mode.SUBTRACT)
        with BuildLine():
            Line((12.5, 9.5), (10.5, 9.5))
            ThreePointArc((10.5, 9.5), (9.792893219, 9.792893219), (9.5, 10.5))
            Line((9.5, 10.5), (9.5, 12.5))
            ThreePointArc((9.5, 12.5), (9.792893219, 13.207106781), (10.5, 13.5))
            Line((10.5, 13.5), (12.5, 13.5))
            ThreePointArc((12.5, 13.5), (13.207106781, 13.207106781), (13.5, 12.5))
            Line((13.5, 12.5), (13.5, 10.5))
            ThreePointArc((13.5, 10.5), (13.207106781, 9.792893219), (12.5, 9.5))
        make_face(mode=Mode.SUBTRACT)
        with BuildLine():
            Line((9.5, -12.5), (9.5, -10.5))
            ThreePointArc((9.5, -10.5), (9.792893219, -9.792893219), (10.5, -9.5))
            Line((10.5, -9.5), (12.5, -9.5))
            ThreePointArc((12.5, -9.5), (13.207106781, -9.792893219), (13.5, -10.5))
            Line((13.5, -10.5), (13.5, -12.5))
            ThreePointArc((13.5, -12.5), (13.207106781, -13.207106781), (12.5, -13.5))
            Line((12.5, -13.5), (10.5, -13.5))
            ThreePointArc((10.5, -13.5), (9.792893219, -13.207106781), (9.5, -12.5))
        make_face(mode=Mode.SUBTRACT)
        with BuildLine():
            Line((-9.5, -10.5), (-9.5, -12.5))
            ThreePointArc((-9.5, -12.5), (-9.792893219, -13.207106781), (-10.5, -13.5))
            Line((-10.5, -13.5), (-12.5, -13.5))
            ThreePointArc((-12.5, -13.5), (-13.207106781, -13.207106781), (-13.5, -12.5))
            Line((-13.5, -12.5), (-13.5, -10.5))
            ThreePointArc((-13.5, -10.5), (-13.207106781, -9.792893219), (-12.5, -9.5))
            Line((-12.5, -9.5), (-10.5, -9.5))
            ThreePointArc((-10.5, -9.5), (-9.792893219, -9.792893219), (-9.5, -10.5))
        make_face(mode=Mode.SUBTRACT)
    extrude(amount=CUT_EXTRUDE3_DEPTH, mode=Mode.SUBTRACT)


solid = part.part
